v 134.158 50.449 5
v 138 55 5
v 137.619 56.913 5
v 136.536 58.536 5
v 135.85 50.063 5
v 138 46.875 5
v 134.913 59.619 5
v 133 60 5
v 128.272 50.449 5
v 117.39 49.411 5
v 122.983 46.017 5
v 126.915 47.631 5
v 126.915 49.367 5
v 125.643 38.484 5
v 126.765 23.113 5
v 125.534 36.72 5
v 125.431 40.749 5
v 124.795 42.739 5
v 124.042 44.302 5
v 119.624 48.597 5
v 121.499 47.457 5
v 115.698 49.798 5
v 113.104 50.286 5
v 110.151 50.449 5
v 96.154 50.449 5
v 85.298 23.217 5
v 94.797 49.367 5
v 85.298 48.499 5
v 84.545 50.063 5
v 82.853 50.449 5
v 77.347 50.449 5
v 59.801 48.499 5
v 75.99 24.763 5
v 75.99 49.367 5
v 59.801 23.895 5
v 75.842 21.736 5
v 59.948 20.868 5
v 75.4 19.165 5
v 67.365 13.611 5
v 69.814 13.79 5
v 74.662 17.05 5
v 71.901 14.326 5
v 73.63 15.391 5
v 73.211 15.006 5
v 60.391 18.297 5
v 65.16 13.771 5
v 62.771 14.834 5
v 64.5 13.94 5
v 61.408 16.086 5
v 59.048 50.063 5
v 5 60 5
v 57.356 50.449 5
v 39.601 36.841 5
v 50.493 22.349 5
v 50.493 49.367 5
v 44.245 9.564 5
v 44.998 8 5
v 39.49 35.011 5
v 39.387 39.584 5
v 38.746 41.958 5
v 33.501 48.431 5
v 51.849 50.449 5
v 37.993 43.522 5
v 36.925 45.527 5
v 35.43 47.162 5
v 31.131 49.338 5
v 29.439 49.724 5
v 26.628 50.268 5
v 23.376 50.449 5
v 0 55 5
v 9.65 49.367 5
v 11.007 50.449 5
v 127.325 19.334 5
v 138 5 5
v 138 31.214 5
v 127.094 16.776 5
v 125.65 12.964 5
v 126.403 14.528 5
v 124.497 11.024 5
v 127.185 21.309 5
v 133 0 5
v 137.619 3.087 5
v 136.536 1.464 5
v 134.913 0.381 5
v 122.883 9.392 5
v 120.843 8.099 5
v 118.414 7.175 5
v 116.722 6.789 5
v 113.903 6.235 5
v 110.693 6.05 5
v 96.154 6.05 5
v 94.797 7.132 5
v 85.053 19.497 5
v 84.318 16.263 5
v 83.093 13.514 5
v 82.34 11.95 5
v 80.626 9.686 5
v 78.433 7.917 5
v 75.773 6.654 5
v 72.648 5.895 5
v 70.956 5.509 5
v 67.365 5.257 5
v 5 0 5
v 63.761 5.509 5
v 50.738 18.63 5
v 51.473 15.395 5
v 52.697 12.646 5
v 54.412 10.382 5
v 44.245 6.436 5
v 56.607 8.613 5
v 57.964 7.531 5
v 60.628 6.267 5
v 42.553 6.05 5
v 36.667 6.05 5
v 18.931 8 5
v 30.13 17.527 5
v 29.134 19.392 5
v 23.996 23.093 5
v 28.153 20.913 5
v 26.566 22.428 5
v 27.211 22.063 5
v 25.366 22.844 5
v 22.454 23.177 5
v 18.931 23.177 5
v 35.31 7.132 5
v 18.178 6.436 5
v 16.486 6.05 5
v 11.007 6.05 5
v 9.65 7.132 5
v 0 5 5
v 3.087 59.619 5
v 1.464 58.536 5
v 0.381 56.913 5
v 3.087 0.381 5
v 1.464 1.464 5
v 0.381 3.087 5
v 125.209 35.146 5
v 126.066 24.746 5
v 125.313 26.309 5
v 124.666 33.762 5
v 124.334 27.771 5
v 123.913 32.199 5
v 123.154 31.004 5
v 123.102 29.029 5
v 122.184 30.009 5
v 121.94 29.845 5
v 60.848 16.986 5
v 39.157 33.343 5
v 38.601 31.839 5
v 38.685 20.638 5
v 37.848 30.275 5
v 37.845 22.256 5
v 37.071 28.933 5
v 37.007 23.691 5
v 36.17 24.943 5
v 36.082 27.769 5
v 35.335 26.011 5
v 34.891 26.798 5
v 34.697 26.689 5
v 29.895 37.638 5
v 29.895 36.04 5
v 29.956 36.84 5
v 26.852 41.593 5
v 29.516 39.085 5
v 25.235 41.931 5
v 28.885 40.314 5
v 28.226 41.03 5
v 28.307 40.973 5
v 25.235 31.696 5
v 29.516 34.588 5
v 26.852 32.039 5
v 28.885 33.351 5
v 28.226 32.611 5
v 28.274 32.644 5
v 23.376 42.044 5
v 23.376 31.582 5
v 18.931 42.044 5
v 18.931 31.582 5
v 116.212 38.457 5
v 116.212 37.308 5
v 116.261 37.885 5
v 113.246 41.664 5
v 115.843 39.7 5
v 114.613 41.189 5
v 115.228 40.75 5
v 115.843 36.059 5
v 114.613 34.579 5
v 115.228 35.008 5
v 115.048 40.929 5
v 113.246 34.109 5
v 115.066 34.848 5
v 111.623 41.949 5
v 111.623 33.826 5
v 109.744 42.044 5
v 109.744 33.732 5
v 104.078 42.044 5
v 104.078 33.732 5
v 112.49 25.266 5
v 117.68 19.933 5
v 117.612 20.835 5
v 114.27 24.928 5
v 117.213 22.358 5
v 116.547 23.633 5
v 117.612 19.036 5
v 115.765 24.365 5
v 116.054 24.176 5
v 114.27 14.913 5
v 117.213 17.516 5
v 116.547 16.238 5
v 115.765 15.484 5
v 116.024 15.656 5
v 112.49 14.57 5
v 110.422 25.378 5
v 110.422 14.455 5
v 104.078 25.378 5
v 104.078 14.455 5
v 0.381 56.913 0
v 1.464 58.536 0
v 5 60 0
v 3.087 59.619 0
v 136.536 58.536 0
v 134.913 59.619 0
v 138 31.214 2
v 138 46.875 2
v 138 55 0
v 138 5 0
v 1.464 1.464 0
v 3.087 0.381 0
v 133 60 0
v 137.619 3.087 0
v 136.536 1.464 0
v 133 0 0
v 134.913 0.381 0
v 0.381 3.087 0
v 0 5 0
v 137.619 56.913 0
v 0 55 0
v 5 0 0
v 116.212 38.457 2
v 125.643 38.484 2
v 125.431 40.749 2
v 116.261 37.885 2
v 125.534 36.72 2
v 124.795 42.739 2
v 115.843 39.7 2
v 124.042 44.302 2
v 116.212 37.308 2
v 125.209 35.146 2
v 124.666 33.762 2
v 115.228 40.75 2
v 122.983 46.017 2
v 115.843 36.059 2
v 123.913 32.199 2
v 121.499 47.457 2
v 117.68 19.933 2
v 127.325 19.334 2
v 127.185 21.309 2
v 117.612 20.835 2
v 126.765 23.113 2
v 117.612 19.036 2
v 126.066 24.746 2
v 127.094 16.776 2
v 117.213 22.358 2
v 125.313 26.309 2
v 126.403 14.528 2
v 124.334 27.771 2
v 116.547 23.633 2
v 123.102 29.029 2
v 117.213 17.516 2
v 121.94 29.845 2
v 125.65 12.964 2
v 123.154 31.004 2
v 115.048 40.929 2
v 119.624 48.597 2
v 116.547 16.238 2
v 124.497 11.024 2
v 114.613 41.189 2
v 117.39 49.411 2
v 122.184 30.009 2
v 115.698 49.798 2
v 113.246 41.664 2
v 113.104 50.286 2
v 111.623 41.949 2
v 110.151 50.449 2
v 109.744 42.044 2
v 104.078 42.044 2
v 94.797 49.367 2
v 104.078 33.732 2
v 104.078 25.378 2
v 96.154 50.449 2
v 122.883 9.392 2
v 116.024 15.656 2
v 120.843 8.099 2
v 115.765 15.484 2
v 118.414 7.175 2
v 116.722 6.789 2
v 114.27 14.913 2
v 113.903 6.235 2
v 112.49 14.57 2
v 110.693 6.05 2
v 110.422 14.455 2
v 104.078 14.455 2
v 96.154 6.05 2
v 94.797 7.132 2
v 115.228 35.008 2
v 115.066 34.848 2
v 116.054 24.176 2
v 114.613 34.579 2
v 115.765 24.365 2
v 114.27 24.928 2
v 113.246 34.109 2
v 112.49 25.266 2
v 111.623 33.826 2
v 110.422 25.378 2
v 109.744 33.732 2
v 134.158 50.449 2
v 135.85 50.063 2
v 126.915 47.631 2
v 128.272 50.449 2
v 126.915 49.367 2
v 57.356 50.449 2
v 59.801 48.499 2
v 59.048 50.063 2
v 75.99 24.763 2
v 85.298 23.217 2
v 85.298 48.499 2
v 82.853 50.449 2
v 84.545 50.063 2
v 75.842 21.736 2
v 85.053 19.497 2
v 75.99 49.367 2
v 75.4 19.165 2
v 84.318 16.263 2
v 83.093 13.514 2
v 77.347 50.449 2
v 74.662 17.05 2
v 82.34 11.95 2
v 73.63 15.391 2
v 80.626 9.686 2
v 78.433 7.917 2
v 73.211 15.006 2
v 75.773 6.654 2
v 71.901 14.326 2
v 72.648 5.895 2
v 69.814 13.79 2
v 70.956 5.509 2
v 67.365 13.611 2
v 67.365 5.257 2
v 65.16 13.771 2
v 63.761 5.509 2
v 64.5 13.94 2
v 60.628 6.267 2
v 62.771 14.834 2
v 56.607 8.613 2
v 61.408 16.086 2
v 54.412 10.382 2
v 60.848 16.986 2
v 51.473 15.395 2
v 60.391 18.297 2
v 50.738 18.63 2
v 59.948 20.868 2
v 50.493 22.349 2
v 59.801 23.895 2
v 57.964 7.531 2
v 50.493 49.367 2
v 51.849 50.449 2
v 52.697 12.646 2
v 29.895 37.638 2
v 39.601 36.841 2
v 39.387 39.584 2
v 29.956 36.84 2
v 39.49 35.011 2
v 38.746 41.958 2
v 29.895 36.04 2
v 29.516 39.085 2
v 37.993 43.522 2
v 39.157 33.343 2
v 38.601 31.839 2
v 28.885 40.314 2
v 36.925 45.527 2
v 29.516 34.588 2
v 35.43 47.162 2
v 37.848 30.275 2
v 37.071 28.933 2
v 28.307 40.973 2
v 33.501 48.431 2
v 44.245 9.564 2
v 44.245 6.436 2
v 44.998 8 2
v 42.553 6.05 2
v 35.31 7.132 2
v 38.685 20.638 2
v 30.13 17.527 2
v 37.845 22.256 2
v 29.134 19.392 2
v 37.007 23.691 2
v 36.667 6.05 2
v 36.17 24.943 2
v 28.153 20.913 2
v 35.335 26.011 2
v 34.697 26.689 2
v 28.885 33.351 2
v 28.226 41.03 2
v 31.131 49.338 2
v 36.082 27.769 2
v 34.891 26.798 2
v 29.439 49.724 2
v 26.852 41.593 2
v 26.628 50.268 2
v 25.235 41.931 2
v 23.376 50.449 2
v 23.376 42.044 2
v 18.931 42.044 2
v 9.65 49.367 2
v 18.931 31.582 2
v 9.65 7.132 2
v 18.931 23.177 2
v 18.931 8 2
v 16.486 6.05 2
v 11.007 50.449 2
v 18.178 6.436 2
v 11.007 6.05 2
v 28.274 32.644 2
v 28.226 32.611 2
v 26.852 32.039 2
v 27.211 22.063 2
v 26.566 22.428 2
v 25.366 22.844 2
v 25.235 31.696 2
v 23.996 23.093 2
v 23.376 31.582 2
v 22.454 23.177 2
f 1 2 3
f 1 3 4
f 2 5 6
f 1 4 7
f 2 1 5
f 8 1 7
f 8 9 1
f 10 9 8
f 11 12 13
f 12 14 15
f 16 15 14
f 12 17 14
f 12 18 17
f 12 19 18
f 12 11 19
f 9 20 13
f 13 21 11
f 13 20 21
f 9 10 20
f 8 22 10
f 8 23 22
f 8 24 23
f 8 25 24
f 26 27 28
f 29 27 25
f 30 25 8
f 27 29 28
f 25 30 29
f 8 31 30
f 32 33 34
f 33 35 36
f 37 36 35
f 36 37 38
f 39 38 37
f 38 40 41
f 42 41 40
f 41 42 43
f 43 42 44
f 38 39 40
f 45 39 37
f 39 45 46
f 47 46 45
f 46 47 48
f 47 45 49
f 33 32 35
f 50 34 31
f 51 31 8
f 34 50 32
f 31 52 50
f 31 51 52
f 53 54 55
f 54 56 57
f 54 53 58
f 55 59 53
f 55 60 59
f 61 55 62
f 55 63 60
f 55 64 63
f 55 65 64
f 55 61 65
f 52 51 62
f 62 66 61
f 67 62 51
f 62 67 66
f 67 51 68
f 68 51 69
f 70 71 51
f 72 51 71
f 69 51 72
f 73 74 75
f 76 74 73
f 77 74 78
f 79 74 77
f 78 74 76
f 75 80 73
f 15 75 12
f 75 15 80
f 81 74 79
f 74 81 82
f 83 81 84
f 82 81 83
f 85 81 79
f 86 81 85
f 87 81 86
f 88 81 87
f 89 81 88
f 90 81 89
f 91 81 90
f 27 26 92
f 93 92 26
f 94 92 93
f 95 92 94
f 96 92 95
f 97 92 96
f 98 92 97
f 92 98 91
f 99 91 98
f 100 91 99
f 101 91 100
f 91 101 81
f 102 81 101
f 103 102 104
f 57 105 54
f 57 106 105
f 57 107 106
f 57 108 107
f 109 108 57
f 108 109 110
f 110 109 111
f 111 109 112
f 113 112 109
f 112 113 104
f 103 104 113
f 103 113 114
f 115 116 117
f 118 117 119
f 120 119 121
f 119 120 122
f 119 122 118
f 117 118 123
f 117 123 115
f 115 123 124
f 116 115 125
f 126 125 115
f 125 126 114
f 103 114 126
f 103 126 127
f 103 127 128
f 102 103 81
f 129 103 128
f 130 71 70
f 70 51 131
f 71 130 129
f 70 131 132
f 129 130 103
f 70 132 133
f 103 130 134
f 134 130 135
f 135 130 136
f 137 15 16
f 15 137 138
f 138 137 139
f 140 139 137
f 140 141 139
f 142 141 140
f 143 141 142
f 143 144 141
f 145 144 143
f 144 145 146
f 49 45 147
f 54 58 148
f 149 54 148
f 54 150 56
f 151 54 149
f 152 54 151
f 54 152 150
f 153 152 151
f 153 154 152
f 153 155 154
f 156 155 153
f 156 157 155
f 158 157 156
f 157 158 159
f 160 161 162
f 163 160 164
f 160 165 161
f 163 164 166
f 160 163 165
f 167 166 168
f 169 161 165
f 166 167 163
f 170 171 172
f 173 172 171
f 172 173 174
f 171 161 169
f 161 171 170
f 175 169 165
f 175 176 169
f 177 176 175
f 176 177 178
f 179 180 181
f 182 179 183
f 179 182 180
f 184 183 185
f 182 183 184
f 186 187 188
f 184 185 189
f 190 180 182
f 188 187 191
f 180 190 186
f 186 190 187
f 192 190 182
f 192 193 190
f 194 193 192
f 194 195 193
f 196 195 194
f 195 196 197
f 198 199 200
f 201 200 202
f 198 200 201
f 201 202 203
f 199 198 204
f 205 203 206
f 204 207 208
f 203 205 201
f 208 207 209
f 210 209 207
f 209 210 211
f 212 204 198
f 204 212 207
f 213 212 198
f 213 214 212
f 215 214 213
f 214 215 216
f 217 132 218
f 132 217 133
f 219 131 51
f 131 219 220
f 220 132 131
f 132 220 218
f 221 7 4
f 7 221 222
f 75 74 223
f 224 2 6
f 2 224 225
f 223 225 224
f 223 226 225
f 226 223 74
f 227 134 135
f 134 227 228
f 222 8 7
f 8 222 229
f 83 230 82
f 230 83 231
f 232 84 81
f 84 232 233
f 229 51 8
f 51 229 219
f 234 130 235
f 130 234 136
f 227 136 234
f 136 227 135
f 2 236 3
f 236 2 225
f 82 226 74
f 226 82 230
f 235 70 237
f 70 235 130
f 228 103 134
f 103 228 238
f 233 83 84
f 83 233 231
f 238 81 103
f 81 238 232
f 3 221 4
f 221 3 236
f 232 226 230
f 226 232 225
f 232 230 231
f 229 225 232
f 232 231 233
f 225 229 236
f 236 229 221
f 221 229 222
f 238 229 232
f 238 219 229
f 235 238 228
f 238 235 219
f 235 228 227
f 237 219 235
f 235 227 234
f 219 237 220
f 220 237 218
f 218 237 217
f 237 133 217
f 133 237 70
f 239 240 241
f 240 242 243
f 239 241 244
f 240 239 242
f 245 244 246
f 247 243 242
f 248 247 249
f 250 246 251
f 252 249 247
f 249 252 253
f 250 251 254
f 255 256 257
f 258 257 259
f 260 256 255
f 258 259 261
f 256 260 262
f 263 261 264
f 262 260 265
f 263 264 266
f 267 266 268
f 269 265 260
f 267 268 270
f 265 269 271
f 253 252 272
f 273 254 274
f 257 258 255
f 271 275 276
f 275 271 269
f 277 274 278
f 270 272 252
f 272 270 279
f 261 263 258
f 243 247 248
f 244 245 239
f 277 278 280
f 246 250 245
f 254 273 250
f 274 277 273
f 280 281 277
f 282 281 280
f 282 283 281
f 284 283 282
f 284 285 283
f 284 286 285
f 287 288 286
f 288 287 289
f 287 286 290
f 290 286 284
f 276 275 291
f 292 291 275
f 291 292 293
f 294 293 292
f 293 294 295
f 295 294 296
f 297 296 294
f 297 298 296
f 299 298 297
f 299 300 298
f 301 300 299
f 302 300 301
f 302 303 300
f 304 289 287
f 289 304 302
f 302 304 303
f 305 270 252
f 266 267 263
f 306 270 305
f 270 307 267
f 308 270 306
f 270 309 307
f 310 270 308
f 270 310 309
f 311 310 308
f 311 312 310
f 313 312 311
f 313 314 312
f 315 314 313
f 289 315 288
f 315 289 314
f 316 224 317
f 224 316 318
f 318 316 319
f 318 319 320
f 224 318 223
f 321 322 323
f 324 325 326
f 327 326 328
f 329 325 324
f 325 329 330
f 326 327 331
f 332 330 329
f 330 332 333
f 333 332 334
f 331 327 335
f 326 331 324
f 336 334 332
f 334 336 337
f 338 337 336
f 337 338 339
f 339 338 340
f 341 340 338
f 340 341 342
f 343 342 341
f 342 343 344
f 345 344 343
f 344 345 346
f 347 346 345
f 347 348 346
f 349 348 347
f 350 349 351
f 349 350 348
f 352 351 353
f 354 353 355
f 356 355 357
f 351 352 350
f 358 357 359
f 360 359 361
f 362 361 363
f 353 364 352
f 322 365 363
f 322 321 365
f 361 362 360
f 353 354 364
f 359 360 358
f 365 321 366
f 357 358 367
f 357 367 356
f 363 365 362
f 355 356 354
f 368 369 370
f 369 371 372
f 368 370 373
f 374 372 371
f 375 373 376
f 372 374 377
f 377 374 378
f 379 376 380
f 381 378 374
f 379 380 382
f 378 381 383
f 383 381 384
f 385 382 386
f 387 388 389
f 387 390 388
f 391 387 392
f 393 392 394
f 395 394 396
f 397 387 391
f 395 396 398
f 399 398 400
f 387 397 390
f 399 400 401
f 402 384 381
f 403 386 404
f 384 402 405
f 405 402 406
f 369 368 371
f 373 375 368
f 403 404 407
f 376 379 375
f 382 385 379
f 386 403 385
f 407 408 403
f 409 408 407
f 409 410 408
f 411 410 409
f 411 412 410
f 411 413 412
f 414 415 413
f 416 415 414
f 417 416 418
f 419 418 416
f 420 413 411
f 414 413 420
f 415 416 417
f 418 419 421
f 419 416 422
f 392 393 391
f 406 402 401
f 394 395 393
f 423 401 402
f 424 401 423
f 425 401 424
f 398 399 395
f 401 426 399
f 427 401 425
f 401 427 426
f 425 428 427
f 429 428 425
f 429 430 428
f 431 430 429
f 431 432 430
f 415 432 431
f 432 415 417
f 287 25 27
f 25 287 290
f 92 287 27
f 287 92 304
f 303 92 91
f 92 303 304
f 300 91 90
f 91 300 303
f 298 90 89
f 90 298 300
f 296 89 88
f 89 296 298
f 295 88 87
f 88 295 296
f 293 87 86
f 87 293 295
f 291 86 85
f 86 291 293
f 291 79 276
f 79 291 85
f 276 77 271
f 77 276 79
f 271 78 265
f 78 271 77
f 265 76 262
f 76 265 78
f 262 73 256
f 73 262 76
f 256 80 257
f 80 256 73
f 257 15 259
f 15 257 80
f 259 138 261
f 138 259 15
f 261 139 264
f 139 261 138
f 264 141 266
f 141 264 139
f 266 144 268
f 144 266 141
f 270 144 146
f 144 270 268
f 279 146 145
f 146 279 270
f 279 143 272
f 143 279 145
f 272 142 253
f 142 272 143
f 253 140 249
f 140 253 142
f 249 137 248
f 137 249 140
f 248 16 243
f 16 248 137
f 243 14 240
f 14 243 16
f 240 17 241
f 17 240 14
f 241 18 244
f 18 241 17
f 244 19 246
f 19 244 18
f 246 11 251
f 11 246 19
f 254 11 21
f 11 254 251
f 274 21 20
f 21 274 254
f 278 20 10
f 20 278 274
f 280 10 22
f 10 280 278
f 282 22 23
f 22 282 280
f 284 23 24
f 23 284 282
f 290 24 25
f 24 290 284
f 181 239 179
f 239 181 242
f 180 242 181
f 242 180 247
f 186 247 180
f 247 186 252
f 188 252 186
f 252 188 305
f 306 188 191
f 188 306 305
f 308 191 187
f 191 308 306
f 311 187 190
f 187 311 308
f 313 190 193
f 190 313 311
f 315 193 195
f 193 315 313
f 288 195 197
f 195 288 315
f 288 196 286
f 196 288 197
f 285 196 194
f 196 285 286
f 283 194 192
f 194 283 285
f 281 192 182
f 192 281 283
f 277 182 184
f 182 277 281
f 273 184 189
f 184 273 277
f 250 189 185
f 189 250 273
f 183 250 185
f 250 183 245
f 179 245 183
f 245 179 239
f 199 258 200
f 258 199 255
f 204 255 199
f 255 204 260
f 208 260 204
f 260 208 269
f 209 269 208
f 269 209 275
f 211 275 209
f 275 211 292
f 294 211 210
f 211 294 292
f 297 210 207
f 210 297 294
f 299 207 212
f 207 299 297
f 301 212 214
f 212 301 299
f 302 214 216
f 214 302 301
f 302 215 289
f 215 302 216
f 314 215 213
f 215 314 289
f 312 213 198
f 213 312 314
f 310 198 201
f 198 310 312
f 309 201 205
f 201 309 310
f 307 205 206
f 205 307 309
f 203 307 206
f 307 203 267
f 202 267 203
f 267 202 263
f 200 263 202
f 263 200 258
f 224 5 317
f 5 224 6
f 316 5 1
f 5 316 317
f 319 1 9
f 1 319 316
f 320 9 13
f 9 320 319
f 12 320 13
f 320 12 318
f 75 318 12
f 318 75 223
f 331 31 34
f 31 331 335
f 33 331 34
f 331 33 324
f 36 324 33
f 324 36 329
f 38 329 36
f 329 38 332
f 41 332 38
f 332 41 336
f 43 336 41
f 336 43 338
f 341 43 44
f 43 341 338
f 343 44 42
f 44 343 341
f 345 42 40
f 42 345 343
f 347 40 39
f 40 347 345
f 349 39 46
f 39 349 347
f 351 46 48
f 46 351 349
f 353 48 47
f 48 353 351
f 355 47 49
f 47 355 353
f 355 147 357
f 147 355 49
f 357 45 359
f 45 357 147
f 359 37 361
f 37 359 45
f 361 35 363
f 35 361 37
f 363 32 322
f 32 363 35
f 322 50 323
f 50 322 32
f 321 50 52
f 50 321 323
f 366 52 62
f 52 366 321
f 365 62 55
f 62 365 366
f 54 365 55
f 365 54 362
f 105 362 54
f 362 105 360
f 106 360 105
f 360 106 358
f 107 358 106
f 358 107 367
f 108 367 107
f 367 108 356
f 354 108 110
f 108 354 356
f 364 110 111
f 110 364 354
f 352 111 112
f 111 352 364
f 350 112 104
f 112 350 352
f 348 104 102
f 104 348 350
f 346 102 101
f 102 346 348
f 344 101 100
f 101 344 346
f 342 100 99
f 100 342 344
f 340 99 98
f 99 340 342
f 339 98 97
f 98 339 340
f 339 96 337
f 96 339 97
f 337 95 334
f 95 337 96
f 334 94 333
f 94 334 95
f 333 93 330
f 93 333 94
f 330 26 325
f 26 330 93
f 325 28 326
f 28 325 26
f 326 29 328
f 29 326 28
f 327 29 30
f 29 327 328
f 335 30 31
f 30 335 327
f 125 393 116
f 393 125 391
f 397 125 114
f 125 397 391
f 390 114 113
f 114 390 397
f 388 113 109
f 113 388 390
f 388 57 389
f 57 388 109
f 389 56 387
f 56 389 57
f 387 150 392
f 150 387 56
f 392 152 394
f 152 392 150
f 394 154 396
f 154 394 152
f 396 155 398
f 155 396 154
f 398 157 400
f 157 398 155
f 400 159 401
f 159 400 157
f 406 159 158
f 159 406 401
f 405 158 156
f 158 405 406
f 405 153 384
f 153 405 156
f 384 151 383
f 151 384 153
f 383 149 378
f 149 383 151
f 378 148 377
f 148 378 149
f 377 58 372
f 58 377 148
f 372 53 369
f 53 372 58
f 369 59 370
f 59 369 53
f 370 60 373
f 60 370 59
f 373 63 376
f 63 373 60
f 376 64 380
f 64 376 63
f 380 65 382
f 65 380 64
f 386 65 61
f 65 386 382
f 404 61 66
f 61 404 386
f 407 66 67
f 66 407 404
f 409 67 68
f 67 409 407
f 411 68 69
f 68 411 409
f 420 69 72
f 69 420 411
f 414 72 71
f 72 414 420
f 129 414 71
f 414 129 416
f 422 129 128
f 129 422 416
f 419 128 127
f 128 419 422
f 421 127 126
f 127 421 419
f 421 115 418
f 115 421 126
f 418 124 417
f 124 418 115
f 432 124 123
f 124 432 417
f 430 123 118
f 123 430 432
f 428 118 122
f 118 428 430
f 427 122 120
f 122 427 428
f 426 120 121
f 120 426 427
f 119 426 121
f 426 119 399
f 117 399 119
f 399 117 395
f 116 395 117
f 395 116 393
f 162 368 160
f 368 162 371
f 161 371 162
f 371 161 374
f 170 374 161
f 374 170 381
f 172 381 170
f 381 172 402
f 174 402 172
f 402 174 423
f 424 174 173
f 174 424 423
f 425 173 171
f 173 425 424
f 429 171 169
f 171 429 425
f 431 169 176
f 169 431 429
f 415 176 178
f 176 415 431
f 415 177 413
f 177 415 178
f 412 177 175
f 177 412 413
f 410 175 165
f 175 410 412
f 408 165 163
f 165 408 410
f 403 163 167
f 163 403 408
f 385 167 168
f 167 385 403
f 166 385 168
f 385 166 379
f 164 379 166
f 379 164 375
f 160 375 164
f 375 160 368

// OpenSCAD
// file: scad-utils/mirror.scad
// Laser Tunnel -- Angled Mirror Holder
// Adrian McCarthy 2022

// A larger angle makes a wider cone of light. (degrees)
Angle = 5; // [3:1:20]

// The mirror should not be wider than the hub of the fan. (mm)
Mirror_Diameter = 25.4; // [20:0.2:27]

// The mirror should be thin and light. (mm)
Mirror_Thickness = 1.75; // [1:0.25:2]

// Some dimensions may be optimized for your printer's nozzle size, but the default value should work for most. (mm)
Nozzle_Diameter = 0.4;  // [0.1:0.1:0.8]

module angled_mirror_holder(angle=5, mirror_d=25.4, mirror_th=1.75, nozzle_d=0.4) {
    h = mirror_d;
    inner_d = mirror_d + nozzle_d;
    outer_d = inner_d + 2;
    box = sqrt(2)*outer_d;
    intersection() {
        r = inner_d/2;
        translate([r, 0, 0]) rotate([0, angle, 0]) translate([-r, 0, 0])
        difference() {
            translate([0, 0, mirror_th-h]) cylinder(d=outer_d, h=h);
            translate([0, 0, 0.1]) cylinder(d=inner_d, h=h);
        }

        translate([-box/2, -box/2, 0]) cube(box);
    }
}

angled_mirror_holder(Angle, Mirror_Diameter, Mirror_Thickness, Nozzle_Diameter, $fn=92);
// file: scad-utils/morphology.scad
// Copyright (c) 2013 Oskar Linde. All rights reserved.
// License: BSD
//
// This library contains basic 2D morphology operations
//
// outset(d=1)            - creates a polygon at an offset d outside a 2D shape
// inset(d=1)             - creates a polygon at an offset d inside a 2D shape
// fillet(r=1)            - adds fillets of radius r to all concave corners of a 2D shape
// rounding(r=1)          - adds rounding to all convex corners of a 2D shape
// shell(d,center=false)  - makes a shell of width d along the edge of a 2D shape
//                        - positive values of d places the shell on the outside
//                        - negative values of d places the shell on the inside
//                        - center=true and positive d places the shell centered on the edge

module outset(d=1) {
	// Bug workaround for older OpenSCAD versions
	if (version_num() < 20130424) render() outset_extruded(d) children();
	else minkowski() {
		circle(r=d);
		children();
	}
}

module outset_extruded(d=1) {
   projection(cut=true) minkowski() {
        cylinder(r=d);
        linear_extrude(center=true) children();
   }
}

module inset(d=1) {
	 render() inverse() outset(d=d) inverse() children();
}

module fillet(r=1) {
	inset(d=r) render() outset(d=r) children();
}

module rounding(r=1) {
	outset(d=r) inset(d=r) children();
}

module shell(d,center=false) {
	if (center && d > 0) {
		difference() {
			outset(d=d/2) children();
			inset(d=d/2) children();
		}
	}
	if (!center && d > 0) {
		difference() {
			outset(d=d) children();
			children();
		}
	}
	if (!center && d < 0) {
		difference() {
			children();
			inset(d=-d) children();
		}
	}
	if (d == 0) children();
}


// Below are for internal use only

module inverse() {
	difference() {
		square(1e5,center=true);
		children();
	}
}


// TEST CODE

use <mirror.scad>

module arrow(l=1,w=.6,t=0.15) {
	mirror_y() polygon([[0,0],[l,0],[l-w/2,w/2],[l-w/2-sqrt(2)*t,w/2],[l-t/2-sqrt(2)*t,t/2],[0,t/2]]);
}

module shape() {
	polygon([[0,0],[1,0],[1.5,1],[2.5,1],[2,-1],[0,-1]]);
}

if(0) assign($fn=32) {

	for (p = [0:10*3-1]) assign(o=floor(p/3)) {
		translate([(p%3)*2.5,-o*3]) {
			//%if (p % 3 == 1) translate([0,0,1]) shape();
			if (p % 3 == 0) shape();
			if (p % 3 == 1) translate([0.6,0]) arrow();
			if (p % 3 == 2) {
				if (o == 0) inset(d=0.3) shape();
				if (o == 1) outset(d=0.3) shape();
				if (o == 2) rounding(r=0.3) shape();
				if (o == 3) fillet(r=0.3) shape();
				if (o == 4) shell(d=0.3) shape();
				if (o == 5) shell(d=-0.3) shape();
				if (o == 6) shell(d=0.3,center=true) shape();
				if (o == 7) rounding(r=0.3) fillet(r=0.3) shape();
				if (o == 8) shell(d=0.3,center=true) fillet(r=0.3) rounding(r=0.3) shape();
				if (o == 9) shell(d=-0.3) fillet(r=0.3) rounding(r=0.3) shape();
			}
		}
	}
}
// main file
use <scad-utils/morphology.scad>

board("RUBY", 138);
//board("ABC", 106);

module letters() {
    linear_extrude(height=10)
        text("RUBYAC", size=40, font="Impact");
}

module board(text, width) {
    difference() {
       z_rounded_cube([width,60,5], r=5);
        translate([6,8,2]) linear_extrude(height=3.01)
            outset(d=2) text(text, size=40, font="Impact", spacing=1.1);
    }
}

module z_rounded_cube(size, r=1) {
    linear_extrude(height=size[2])
        rounding(r=r)
            polygon([ [0,0], [size[0],0], [size[0],size[1]], [0,size[1]] ]);
}
